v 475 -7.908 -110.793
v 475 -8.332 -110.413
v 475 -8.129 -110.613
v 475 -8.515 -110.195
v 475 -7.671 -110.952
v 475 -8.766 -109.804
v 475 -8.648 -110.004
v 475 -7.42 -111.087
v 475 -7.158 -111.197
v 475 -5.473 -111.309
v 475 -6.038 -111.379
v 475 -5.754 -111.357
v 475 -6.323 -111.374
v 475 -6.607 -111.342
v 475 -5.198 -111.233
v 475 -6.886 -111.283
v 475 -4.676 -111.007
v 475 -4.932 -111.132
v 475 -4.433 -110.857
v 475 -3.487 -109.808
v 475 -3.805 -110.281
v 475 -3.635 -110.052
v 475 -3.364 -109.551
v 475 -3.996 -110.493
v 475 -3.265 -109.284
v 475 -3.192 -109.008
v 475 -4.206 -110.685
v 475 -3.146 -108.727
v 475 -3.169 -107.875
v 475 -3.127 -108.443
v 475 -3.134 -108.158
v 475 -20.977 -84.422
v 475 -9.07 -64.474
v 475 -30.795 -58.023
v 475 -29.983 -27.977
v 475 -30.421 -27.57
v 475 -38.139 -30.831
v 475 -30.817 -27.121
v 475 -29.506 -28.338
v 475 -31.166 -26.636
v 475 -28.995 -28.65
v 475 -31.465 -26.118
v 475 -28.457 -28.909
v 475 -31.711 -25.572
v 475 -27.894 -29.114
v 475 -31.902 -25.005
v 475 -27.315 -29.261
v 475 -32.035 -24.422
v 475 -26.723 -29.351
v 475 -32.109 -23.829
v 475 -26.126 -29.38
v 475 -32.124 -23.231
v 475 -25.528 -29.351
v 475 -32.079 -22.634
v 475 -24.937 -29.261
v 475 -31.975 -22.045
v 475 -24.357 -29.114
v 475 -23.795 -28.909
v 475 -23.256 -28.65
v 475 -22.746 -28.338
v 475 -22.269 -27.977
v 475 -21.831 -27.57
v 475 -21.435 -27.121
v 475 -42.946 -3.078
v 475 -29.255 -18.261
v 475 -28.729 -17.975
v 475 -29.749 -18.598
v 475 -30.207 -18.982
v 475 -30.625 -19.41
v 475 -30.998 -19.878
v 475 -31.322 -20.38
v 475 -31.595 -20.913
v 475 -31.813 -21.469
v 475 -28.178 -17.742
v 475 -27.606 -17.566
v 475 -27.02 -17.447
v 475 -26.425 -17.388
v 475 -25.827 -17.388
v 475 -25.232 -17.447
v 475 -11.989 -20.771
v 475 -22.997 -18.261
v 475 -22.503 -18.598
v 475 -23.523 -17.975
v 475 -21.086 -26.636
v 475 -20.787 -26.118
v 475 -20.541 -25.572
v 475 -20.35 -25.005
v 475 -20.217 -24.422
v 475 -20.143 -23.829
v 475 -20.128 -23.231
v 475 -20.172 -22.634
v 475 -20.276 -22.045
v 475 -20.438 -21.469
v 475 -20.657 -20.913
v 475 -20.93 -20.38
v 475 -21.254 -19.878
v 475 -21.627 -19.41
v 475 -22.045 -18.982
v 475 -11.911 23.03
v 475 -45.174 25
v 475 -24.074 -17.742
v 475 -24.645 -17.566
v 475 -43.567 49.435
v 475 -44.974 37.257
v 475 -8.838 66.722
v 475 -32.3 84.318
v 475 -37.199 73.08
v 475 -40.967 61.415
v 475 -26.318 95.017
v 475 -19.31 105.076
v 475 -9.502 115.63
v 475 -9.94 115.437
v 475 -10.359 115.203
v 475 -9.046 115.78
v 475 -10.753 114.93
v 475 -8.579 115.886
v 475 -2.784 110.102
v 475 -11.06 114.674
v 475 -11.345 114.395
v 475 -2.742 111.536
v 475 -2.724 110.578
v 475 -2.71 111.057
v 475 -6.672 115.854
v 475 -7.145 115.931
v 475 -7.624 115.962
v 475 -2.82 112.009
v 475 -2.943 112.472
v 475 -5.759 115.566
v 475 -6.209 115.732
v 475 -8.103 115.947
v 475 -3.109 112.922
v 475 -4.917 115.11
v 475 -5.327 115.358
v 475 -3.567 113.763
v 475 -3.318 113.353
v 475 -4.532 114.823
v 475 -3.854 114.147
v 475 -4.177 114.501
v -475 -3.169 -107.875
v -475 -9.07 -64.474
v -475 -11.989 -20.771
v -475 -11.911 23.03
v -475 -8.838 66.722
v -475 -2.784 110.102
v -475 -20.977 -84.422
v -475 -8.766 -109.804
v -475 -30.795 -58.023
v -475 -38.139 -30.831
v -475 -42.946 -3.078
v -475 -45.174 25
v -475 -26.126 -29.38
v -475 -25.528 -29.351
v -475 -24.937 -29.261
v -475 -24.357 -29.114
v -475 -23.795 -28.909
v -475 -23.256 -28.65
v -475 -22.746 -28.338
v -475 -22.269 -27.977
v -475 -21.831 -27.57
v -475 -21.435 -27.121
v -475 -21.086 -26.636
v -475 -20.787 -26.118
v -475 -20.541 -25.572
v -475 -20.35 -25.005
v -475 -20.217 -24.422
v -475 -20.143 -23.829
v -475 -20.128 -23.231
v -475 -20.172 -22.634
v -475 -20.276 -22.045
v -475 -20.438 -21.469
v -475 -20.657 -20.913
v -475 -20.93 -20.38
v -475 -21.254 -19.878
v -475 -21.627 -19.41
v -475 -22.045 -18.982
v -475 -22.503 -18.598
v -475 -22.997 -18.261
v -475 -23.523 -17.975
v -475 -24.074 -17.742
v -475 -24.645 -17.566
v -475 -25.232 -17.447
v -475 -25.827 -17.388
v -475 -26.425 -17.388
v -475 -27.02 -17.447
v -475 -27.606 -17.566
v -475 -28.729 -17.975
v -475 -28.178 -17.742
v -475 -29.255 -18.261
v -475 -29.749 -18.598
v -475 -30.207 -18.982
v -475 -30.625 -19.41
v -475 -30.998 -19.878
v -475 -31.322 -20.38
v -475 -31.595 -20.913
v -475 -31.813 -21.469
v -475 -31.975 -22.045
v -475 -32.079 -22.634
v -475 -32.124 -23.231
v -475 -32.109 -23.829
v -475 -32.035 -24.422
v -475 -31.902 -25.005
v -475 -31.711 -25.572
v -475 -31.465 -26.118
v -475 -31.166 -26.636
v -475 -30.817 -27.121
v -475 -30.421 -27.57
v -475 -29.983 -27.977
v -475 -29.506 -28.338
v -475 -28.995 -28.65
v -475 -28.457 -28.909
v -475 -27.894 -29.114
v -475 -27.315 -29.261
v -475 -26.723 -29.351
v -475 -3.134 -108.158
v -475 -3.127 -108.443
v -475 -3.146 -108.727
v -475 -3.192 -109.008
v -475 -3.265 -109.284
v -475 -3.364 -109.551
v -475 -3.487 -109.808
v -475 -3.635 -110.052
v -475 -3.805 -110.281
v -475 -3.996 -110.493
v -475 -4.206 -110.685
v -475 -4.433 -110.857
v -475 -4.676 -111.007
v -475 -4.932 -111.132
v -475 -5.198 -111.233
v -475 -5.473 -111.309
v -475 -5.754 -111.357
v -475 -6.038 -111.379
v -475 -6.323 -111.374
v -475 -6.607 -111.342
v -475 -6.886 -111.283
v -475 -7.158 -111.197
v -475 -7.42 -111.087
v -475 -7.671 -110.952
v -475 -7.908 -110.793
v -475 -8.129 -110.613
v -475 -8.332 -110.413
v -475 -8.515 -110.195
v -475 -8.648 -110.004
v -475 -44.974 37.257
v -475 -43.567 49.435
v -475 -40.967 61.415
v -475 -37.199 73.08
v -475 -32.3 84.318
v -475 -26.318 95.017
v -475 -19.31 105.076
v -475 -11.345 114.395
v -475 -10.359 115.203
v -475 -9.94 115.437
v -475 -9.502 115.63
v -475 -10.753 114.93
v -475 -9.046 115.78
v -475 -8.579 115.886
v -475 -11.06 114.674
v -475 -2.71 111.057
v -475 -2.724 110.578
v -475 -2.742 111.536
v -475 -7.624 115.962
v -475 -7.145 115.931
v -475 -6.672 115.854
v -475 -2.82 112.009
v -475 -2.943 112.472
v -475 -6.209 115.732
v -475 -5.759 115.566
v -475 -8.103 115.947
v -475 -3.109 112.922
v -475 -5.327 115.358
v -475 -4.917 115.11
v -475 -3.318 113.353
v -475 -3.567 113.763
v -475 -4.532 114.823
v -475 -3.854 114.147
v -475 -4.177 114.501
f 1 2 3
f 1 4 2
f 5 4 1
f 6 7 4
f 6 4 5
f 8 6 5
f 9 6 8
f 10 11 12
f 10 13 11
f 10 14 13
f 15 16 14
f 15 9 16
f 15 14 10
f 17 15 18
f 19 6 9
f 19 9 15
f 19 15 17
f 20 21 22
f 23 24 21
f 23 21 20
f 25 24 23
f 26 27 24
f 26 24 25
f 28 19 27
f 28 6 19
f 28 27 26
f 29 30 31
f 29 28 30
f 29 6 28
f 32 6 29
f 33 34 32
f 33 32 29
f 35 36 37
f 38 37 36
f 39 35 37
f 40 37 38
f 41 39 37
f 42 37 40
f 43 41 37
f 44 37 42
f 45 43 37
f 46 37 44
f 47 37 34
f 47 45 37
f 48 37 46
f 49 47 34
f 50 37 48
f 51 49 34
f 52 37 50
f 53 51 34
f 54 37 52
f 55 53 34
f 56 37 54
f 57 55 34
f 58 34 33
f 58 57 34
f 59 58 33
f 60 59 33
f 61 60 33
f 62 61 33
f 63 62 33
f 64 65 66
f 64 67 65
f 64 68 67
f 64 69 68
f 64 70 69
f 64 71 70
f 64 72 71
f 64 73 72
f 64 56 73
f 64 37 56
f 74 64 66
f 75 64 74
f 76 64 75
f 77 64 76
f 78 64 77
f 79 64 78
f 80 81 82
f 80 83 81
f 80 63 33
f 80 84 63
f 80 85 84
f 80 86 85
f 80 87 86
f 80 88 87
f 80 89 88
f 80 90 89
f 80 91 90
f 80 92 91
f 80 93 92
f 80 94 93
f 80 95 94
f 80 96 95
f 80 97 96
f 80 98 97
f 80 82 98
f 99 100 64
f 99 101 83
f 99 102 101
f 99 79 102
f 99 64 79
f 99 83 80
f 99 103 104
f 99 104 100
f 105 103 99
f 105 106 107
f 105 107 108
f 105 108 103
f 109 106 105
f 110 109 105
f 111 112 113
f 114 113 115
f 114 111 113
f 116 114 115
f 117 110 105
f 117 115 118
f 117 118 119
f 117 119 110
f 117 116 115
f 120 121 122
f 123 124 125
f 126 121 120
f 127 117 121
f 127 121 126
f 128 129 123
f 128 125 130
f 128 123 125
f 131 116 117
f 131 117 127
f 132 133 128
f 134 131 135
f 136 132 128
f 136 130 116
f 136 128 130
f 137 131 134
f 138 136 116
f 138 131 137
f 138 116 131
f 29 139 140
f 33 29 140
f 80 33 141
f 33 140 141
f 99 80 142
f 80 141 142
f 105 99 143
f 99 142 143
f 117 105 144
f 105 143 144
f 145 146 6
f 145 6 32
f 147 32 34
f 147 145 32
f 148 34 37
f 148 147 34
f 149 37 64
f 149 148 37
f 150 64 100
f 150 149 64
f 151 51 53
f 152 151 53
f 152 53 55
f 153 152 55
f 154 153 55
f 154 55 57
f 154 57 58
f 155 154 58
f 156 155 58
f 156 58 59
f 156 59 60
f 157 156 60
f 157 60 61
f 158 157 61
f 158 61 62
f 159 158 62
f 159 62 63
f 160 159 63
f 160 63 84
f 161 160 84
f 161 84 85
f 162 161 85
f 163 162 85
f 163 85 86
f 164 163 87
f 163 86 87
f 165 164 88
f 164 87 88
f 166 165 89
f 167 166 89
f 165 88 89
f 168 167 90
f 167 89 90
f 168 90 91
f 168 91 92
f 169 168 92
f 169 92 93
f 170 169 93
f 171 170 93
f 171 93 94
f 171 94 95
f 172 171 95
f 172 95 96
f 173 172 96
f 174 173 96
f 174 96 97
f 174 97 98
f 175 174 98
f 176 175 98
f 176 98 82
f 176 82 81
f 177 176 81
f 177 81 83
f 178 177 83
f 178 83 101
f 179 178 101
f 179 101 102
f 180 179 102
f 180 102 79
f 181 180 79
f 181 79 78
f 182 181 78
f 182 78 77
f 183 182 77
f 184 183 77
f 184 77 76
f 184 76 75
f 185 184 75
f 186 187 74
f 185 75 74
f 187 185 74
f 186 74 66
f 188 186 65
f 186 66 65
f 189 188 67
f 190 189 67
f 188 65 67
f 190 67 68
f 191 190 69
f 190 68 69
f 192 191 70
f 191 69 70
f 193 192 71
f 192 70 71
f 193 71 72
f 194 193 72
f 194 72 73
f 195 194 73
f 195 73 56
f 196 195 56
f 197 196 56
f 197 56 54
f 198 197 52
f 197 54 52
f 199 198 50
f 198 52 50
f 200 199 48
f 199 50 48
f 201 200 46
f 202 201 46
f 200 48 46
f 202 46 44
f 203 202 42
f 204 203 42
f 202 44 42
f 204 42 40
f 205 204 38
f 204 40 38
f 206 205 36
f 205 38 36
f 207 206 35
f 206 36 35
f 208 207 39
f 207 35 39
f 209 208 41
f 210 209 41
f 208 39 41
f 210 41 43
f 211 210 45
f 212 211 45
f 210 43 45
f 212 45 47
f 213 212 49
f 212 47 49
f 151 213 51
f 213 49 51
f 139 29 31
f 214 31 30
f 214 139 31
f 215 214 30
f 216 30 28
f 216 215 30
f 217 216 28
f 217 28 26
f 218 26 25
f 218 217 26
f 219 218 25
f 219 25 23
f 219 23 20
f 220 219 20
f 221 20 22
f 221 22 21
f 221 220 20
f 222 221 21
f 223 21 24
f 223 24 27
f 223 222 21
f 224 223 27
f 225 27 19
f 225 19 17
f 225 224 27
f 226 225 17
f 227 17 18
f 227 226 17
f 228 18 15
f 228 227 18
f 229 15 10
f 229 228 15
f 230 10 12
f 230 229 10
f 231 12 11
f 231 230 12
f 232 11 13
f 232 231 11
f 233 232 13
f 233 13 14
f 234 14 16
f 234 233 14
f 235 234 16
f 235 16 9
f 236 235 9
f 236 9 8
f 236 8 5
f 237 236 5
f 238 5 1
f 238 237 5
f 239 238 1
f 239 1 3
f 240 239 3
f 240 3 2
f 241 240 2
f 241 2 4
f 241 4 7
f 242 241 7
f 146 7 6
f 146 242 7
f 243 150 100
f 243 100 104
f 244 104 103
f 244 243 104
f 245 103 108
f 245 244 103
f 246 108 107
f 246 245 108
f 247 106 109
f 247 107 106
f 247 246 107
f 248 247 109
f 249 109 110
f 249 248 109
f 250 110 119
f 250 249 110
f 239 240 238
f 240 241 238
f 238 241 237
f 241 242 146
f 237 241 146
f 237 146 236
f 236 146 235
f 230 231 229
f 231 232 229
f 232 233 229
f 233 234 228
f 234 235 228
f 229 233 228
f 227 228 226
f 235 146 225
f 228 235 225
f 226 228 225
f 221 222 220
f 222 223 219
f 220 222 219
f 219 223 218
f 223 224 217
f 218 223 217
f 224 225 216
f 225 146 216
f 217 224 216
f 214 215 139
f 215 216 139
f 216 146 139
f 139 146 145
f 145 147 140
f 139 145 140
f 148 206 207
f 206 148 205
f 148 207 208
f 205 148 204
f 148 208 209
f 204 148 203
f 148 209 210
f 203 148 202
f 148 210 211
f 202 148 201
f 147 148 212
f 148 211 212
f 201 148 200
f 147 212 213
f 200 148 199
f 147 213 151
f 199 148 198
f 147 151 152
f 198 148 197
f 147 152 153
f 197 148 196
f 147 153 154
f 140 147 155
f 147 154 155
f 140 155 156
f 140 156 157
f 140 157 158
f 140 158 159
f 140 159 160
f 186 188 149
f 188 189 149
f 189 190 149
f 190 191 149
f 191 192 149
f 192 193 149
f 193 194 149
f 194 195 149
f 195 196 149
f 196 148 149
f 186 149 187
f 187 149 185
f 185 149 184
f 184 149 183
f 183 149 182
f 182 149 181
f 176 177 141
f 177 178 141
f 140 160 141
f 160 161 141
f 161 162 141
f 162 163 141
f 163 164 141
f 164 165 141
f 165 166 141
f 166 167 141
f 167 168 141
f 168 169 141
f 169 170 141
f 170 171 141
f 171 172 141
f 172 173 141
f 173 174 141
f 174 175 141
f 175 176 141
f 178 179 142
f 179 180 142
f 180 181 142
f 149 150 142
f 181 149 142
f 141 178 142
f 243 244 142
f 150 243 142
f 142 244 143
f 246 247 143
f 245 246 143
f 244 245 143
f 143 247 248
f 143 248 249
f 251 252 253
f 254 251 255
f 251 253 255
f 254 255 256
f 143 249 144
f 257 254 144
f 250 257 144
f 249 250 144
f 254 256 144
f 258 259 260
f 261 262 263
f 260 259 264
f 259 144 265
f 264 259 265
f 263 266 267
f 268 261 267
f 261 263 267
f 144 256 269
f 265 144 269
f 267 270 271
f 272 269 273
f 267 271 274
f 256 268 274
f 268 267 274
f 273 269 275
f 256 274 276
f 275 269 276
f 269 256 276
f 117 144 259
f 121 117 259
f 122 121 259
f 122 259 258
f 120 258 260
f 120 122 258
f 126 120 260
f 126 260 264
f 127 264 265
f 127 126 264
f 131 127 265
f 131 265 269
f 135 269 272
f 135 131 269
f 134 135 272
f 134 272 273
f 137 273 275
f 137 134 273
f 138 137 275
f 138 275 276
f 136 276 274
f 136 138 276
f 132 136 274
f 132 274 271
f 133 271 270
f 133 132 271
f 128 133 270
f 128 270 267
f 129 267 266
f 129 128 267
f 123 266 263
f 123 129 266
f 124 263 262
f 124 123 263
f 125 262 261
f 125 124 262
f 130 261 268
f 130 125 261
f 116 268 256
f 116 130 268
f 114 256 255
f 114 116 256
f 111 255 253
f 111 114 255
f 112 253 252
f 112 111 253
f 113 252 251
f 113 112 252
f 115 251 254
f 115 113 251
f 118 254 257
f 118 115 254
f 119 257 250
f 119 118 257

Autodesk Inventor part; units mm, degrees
ref_plane "YZ Plane" through (0, 0, 0) normal (1, 0, 0) x (0, 1, 0)
ref_plane "XZ Plane" through (0, 0, 0) normal (0, 1, 0) x (-1, 0, 0)
ref_plane "XY Plane" through (0, 0, 0) normal (0, 0, 1) x (1, 0, 0)
sketch "スケッチ1" plane through (0, 0, 0) normal (1, 0, 0) x (0, 1, 0)
  line L0 (0, 125) -> (0, -125)
  line L1 (-193.7075, 0) -> (764.5712, 0) projected
  arc A0 (0, 125) -> (0, -125) centre (627.6743, 0) ccw
  arc A1 (0, 125) -> (-45.1737, 25) centre (79.0119, 29.1041) ccw
  arc A2 (-45.1737, 25) -> (0, -125) centre (259.9333, 35.0832) ccw
  point P0 (0, 0)
  point P1 (0, 0)
  dimension "d0" = 250
  dimension "d1" = 640
  dimension "d16" = 100
extrude "押し出し4" add sketch "スケッチ1" along normal mid plane 950 contours A0 L1 A2 A1 | A0 A2 L1
fillet "フィレット3" radius 5 1 edges at (0, 0, 125)
fillet "フィレット3" radius 3 1 edges at (0, 0, -125)
sketch "スケッチ4" plane through (475, 0, 0) normal (1, 0, 0) x (0, 0, -1)
  circle A0 centre (23.3804, -26.1259) radius 6
  arc A1 (109.8042, -8.7665) -> (107.8747, -3.1688) centre (108.3804, -6.1259) ccw projected
  point P0 (0, 0)
  dimension "d21" = 12
  dimension "d22" = 85
  dimension "d23" = 20
extrude "押し出し5" cut sketch "スケッチ4" against normal through all
properties part number "styro_50_sub" material "ポリスチレン"
